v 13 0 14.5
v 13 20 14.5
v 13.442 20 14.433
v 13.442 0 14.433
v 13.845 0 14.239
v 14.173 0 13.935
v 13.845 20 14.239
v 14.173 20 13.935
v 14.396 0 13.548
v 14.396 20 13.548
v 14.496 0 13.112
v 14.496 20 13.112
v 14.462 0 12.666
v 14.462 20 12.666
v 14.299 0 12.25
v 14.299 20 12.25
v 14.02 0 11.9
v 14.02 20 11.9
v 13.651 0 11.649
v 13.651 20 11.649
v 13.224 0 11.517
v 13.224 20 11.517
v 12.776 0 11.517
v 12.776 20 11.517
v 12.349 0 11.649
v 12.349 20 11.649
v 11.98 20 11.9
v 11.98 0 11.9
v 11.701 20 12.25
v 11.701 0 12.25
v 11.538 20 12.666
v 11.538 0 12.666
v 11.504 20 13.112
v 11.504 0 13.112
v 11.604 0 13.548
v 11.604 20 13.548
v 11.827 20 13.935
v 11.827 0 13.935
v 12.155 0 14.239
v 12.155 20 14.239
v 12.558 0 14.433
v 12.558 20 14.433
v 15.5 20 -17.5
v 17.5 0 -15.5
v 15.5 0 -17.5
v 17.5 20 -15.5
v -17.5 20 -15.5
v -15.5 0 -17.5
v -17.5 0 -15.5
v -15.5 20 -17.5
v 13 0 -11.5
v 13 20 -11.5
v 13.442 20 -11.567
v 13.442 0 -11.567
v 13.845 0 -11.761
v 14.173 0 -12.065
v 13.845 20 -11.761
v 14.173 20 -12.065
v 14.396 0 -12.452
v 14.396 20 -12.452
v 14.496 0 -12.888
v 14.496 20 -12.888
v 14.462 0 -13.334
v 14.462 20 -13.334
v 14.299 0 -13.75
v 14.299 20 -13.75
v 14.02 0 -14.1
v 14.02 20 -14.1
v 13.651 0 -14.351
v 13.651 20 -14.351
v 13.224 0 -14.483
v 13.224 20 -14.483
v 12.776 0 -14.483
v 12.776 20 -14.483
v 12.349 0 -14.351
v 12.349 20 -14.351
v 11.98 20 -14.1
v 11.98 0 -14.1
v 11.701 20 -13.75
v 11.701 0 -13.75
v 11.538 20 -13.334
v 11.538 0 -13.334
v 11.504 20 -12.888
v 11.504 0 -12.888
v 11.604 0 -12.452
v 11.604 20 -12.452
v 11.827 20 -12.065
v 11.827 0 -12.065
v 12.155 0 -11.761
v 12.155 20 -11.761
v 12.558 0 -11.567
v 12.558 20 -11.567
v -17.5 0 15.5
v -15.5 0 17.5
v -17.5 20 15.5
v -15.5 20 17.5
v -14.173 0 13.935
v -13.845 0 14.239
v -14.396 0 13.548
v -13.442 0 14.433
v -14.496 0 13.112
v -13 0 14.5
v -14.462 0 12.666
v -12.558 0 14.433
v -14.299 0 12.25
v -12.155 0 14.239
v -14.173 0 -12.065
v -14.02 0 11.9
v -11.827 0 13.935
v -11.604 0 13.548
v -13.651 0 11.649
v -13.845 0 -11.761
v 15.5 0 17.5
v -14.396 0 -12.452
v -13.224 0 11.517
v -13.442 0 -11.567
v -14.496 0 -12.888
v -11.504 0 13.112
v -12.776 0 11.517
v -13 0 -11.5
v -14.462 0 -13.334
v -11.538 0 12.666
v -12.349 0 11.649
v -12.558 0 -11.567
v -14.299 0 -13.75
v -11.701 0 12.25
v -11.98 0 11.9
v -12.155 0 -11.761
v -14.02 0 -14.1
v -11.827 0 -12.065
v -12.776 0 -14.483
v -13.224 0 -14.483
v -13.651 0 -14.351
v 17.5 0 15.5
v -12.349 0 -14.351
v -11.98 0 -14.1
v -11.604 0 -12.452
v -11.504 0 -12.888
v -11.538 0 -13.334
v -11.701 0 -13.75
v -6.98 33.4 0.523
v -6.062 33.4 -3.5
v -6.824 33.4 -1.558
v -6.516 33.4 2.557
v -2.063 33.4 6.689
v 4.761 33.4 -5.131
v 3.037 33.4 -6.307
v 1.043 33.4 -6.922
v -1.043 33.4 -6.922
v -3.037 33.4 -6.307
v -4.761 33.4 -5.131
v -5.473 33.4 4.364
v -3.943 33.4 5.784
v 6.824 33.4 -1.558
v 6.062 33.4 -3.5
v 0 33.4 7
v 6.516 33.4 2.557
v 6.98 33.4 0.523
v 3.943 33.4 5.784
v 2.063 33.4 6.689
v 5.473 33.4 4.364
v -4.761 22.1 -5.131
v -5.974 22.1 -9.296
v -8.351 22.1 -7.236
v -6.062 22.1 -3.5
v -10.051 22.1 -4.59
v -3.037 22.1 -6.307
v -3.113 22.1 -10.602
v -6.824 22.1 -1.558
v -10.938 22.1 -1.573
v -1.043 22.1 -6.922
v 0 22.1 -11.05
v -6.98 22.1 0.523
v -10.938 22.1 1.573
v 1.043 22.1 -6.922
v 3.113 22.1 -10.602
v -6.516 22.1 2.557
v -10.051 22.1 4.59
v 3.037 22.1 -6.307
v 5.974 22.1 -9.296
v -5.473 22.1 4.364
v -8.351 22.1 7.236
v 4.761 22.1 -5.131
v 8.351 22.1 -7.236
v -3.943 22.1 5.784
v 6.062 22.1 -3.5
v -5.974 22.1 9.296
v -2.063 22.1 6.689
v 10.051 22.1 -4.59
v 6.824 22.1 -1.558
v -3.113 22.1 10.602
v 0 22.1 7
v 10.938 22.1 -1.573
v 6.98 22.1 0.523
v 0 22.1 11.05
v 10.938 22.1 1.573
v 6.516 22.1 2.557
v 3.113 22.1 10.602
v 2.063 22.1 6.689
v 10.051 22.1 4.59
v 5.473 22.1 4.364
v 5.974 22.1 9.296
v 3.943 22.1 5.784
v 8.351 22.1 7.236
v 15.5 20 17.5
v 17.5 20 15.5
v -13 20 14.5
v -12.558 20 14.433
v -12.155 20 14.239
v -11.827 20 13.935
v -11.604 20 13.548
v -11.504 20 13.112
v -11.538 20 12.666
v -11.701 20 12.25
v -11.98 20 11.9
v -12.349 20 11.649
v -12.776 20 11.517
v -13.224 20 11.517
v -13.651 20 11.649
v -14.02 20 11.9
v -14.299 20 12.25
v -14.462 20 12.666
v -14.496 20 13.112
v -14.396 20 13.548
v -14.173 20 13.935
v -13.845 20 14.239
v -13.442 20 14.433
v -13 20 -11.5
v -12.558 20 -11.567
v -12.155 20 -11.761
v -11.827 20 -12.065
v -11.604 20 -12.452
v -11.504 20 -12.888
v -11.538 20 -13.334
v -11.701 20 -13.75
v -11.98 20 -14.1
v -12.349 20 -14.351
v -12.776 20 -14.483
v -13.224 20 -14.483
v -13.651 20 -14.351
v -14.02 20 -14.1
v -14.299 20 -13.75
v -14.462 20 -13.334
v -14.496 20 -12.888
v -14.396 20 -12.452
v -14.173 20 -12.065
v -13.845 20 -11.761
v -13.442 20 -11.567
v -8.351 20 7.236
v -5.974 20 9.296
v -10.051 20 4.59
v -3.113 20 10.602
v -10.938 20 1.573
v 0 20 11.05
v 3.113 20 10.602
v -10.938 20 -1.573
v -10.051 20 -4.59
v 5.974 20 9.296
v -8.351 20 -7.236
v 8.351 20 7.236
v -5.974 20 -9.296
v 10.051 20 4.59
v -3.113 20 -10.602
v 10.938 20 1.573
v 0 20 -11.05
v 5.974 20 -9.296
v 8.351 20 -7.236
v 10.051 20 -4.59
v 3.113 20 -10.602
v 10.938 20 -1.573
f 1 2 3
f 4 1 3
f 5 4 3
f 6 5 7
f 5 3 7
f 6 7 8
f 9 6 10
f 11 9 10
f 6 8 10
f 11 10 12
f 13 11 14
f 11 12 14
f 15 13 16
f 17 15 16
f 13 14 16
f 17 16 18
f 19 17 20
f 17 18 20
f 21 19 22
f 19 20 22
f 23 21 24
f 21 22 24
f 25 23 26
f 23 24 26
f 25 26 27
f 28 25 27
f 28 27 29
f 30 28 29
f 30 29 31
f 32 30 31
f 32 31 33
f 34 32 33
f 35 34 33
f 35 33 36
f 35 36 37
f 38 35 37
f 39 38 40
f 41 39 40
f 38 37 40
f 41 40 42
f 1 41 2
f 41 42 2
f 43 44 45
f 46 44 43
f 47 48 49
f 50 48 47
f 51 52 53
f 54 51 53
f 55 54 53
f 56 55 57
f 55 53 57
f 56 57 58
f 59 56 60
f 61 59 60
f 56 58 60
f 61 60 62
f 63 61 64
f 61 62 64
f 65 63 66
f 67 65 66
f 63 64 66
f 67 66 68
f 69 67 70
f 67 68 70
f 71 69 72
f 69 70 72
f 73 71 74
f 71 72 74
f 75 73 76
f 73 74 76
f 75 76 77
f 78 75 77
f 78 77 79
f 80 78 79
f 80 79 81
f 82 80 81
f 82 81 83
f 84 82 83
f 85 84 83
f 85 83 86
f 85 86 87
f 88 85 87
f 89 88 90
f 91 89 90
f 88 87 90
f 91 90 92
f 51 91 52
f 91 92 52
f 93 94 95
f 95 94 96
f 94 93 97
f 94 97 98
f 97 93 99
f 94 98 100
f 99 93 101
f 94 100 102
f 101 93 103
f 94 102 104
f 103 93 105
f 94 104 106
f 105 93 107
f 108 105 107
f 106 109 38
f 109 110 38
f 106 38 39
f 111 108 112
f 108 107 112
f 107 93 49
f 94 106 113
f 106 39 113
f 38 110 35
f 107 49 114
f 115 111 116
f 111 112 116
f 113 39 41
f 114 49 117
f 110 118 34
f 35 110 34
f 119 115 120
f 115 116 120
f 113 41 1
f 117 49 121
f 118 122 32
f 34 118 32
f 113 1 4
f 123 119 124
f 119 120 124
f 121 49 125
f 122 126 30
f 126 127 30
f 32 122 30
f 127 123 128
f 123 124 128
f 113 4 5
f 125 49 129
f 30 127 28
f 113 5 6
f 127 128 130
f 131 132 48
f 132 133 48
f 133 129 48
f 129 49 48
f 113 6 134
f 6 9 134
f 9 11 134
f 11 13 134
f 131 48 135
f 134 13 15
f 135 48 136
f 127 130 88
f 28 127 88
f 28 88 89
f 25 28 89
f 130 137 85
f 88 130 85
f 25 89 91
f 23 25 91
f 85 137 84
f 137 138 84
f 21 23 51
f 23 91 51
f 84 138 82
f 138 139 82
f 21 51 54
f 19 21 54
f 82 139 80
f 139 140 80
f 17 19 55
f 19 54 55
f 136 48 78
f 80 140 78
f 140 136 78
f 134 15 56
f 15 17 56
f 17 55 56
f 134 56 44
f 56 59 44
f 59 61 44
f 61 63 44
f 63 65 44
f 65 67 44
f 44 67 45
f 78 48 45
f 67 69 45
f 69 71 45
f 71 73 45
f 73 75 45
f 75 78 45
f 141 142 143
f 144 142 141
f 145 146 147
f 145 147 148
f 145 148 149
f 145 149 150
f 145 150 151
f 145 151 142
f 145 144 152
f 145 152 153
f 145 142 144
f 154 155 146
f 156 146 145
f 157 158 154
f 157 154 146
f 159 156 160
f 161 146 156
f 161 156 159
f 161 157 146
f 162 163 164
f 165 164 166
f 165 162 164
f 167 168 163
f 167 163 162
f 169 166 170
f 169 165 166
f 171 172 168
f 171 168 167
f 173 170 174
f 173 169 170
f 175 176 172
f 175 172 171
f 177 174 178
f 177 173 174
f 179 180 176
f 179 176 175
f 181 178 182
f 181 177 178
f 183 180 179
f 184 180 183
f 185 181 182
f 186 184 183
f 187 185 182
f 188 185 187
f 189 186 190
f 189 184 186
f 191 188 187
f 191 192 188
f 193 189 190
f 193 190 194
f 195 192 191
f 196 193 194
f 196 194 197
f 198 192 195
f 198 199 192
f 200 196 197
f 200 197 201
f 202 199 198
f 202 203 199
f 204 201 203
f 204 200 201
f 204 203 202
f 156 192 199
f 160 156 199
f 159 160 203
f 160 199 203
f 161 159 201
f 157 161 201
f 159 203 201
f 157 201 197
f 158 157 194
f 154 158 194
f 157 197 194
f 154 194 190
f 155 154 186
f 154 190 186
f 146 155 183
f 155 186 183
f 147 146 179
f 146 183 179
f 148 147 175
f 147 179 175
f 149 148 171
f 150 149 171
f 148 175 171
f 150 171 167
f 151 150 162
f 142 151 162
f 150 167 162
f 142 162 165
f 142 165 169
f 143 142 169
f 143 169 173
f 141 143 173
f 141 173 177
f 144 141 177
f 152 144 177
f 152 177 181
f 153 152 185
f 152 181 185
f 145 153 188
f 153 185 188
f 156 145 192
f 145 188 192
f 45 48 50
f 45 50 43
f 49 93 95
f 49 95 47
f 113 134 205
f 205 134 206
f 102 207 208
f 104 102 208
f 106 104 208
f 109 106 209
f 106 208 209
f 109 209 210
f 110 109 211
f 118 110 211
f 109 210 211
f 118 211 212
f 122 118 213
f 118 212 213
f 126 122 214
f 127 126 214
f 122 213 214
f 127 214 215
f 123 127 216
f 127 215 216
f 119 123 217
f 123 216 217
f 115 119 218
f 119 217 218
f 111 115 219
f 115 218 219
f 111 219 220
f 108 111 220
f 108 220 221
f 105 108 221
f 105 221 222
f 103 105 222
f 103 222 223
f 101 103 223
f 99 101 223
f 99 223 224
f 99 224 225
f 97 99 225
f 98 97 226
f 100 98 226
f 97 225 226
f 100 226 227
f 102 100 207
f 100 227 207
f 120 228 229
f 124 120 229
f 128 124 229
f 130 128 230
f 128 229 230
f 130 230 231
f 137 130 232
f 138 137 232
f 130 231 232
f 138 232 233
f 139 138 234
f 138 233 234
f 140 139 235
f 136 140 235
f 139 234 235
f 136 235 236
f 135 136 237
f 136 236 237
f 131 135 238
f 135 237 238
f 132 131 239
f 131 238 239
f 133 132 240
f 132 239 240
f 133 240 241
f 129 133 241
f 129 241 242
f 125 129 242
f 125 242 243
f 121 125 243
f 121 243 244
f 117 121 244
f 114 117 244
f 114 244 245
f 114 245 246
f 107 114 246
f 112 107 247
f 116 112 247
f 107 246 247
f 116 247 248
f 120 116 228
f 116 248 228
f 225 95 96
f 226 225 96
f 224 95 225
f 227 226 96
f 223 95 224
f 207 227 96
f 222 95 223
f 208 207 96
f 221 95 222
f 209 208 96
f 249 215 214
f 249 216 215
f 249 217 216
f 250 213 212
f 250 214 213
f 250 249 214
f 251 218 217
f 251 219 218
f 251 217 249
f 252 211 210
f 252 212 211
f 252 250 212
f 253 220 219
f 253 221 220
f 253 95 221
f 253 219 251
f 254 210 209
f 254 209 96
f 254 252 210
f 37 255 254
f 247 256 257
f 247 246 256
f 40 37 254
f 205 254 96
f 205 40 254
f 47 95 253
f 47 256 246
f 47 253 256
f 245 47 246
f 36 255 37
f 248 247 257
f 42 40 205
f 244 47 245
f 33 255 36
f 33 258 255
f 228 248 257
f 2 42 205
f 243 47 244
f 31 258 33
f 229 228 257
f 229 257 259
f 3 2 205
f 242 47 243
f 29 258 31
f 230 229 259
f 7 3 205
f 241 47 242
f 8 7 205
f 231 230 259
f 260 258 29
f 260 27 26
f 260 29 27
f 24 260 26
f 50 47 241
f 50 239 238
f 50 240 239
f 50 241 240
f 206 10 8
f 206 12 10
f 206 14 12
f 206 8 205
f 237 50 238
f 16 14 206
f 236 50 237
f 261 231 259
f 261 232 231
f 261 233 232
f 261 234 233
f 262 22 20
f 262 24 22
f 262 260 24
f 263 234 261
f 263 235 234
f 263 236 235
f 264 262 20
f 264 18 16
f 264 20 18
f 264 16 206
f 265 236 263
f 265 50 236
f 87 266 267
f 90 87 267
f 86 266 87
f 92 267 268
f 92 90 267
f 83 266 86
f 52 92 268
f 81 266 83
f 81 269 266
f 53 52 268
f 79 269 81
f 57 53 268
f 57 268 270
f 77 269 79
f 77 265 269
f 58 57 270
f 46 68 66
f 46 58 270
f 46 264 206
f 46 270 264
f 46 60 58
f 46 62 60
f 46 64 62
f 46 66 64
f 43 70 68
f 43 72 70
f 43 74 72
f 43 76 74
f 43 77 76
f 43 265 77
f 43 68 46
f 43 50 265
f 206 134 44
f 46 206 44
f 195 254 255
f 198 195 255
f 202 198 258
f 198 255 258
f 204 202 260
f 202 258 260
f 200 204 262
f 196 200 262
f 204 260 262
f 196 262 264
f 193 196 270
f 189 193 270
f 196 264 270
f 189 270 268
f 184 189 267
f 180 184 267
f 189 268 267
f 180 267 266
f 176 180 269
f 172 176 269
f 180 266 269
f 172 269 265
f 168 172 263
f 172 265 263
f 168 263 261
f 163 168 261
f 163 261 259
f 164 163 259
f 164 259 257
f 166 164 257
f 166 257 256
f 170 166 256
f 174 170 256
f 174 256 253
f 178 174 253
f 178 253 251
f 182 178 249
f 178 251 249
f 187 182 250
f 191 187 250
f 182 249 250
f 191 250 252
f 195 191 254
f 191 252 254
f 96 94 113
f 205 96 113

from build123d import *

# Parameters (mm, degrees)
SKETCH1_W           = 35
SKETCH1_H           = 35
BOSS_EXTRUDE1_DEPTH = 20
SKETCH3_R           = 1.5
CUT_EXTRUDE1_DEPTH  = 20
CHAMFER1_SIZE       = 2
SKETCH4_R           = 11.05
BOSS_EXTRUDE2_DEPTH = 2.1
SKETCH5_R           = 7
BOSS_EXTRUDE3_DEPTH = 11.3


with BuildPart() as part:
    # Sketch1 → Boss-Extrude1 (new body)
    with BuildSketch(Plane(origin=(0, 0, 0), x_dir=(1, 0, 0), z_dir=(0, 1, 0))):
        Rectangle(SKETCH1_W, SKETCH1_H)
    extrude(amount=BOSS_EXTRUDE1_DEPTH)

    # Sketch3 → Cut-Extrude1 (cut)
    with BuildSketch(Plane(origin=(0, 20, 0), x_dir=(1, 0, 0), z_dir=(0, 1, 0))):
        with Locations(Location((13, 13, 0), (0, 0, 270))):
            Circle(SKETCH3_R)
        with Locations(Location((13, -13, 0), (0, 0, 270))):
            Circle(SKETCH3_R)
        with Locations(Location((-13, -13, 0), (0, 0, 270))):
            Circle(SKETCH3_R)
        with Locations(Location((-13, 13, 0), (0, 0, 270))):
            Circle(SKETCH3_R)
    extrude(amount=-CUT_EXTRUDE1_DEPTH, mode=Mode.SUBTRACT)

    # Chamfer1
    chamfer1_edges = [part.edges().sort_by_distance(p)[0] for p in [
        (17.5, 10, 17.5),
        (-17.5, 10, 17.5),
        (-17.5, 10, -17.5),
        (17.5, 10, -17.5),
    ]]
    chamfer(chamfer1_edges, length=CHAMFER1_SIZE)

    # Sketch4 → Boss-Extrude2 (add)
    with BuildSketch(Plane(origin=(0, 20, 0), x_dir=(1, 0, 0), z_dir=(0, 1, 0))):
        with Locations(Location((0, 0, 0), (0, 0, 270))):
            Circle(SKETCH4_R)
    extrude(amount=BOSS_EXTRUDE2_DEPTH)

    # Sketch5 → Boss-Extrude3 (add)
    with BuildSketch(Plane(origin=(0, 22.1, 0), x_dir=(1, 0, 0), z_dir=(0, 1, 0))):
        with Locations(Location((0, 0, 0), (0, 0, 270))):
            Circle(SKETCH5_R)
    extrude(amount=BOSS_EXTRUDE3_DEPTH)


solid = part.part
